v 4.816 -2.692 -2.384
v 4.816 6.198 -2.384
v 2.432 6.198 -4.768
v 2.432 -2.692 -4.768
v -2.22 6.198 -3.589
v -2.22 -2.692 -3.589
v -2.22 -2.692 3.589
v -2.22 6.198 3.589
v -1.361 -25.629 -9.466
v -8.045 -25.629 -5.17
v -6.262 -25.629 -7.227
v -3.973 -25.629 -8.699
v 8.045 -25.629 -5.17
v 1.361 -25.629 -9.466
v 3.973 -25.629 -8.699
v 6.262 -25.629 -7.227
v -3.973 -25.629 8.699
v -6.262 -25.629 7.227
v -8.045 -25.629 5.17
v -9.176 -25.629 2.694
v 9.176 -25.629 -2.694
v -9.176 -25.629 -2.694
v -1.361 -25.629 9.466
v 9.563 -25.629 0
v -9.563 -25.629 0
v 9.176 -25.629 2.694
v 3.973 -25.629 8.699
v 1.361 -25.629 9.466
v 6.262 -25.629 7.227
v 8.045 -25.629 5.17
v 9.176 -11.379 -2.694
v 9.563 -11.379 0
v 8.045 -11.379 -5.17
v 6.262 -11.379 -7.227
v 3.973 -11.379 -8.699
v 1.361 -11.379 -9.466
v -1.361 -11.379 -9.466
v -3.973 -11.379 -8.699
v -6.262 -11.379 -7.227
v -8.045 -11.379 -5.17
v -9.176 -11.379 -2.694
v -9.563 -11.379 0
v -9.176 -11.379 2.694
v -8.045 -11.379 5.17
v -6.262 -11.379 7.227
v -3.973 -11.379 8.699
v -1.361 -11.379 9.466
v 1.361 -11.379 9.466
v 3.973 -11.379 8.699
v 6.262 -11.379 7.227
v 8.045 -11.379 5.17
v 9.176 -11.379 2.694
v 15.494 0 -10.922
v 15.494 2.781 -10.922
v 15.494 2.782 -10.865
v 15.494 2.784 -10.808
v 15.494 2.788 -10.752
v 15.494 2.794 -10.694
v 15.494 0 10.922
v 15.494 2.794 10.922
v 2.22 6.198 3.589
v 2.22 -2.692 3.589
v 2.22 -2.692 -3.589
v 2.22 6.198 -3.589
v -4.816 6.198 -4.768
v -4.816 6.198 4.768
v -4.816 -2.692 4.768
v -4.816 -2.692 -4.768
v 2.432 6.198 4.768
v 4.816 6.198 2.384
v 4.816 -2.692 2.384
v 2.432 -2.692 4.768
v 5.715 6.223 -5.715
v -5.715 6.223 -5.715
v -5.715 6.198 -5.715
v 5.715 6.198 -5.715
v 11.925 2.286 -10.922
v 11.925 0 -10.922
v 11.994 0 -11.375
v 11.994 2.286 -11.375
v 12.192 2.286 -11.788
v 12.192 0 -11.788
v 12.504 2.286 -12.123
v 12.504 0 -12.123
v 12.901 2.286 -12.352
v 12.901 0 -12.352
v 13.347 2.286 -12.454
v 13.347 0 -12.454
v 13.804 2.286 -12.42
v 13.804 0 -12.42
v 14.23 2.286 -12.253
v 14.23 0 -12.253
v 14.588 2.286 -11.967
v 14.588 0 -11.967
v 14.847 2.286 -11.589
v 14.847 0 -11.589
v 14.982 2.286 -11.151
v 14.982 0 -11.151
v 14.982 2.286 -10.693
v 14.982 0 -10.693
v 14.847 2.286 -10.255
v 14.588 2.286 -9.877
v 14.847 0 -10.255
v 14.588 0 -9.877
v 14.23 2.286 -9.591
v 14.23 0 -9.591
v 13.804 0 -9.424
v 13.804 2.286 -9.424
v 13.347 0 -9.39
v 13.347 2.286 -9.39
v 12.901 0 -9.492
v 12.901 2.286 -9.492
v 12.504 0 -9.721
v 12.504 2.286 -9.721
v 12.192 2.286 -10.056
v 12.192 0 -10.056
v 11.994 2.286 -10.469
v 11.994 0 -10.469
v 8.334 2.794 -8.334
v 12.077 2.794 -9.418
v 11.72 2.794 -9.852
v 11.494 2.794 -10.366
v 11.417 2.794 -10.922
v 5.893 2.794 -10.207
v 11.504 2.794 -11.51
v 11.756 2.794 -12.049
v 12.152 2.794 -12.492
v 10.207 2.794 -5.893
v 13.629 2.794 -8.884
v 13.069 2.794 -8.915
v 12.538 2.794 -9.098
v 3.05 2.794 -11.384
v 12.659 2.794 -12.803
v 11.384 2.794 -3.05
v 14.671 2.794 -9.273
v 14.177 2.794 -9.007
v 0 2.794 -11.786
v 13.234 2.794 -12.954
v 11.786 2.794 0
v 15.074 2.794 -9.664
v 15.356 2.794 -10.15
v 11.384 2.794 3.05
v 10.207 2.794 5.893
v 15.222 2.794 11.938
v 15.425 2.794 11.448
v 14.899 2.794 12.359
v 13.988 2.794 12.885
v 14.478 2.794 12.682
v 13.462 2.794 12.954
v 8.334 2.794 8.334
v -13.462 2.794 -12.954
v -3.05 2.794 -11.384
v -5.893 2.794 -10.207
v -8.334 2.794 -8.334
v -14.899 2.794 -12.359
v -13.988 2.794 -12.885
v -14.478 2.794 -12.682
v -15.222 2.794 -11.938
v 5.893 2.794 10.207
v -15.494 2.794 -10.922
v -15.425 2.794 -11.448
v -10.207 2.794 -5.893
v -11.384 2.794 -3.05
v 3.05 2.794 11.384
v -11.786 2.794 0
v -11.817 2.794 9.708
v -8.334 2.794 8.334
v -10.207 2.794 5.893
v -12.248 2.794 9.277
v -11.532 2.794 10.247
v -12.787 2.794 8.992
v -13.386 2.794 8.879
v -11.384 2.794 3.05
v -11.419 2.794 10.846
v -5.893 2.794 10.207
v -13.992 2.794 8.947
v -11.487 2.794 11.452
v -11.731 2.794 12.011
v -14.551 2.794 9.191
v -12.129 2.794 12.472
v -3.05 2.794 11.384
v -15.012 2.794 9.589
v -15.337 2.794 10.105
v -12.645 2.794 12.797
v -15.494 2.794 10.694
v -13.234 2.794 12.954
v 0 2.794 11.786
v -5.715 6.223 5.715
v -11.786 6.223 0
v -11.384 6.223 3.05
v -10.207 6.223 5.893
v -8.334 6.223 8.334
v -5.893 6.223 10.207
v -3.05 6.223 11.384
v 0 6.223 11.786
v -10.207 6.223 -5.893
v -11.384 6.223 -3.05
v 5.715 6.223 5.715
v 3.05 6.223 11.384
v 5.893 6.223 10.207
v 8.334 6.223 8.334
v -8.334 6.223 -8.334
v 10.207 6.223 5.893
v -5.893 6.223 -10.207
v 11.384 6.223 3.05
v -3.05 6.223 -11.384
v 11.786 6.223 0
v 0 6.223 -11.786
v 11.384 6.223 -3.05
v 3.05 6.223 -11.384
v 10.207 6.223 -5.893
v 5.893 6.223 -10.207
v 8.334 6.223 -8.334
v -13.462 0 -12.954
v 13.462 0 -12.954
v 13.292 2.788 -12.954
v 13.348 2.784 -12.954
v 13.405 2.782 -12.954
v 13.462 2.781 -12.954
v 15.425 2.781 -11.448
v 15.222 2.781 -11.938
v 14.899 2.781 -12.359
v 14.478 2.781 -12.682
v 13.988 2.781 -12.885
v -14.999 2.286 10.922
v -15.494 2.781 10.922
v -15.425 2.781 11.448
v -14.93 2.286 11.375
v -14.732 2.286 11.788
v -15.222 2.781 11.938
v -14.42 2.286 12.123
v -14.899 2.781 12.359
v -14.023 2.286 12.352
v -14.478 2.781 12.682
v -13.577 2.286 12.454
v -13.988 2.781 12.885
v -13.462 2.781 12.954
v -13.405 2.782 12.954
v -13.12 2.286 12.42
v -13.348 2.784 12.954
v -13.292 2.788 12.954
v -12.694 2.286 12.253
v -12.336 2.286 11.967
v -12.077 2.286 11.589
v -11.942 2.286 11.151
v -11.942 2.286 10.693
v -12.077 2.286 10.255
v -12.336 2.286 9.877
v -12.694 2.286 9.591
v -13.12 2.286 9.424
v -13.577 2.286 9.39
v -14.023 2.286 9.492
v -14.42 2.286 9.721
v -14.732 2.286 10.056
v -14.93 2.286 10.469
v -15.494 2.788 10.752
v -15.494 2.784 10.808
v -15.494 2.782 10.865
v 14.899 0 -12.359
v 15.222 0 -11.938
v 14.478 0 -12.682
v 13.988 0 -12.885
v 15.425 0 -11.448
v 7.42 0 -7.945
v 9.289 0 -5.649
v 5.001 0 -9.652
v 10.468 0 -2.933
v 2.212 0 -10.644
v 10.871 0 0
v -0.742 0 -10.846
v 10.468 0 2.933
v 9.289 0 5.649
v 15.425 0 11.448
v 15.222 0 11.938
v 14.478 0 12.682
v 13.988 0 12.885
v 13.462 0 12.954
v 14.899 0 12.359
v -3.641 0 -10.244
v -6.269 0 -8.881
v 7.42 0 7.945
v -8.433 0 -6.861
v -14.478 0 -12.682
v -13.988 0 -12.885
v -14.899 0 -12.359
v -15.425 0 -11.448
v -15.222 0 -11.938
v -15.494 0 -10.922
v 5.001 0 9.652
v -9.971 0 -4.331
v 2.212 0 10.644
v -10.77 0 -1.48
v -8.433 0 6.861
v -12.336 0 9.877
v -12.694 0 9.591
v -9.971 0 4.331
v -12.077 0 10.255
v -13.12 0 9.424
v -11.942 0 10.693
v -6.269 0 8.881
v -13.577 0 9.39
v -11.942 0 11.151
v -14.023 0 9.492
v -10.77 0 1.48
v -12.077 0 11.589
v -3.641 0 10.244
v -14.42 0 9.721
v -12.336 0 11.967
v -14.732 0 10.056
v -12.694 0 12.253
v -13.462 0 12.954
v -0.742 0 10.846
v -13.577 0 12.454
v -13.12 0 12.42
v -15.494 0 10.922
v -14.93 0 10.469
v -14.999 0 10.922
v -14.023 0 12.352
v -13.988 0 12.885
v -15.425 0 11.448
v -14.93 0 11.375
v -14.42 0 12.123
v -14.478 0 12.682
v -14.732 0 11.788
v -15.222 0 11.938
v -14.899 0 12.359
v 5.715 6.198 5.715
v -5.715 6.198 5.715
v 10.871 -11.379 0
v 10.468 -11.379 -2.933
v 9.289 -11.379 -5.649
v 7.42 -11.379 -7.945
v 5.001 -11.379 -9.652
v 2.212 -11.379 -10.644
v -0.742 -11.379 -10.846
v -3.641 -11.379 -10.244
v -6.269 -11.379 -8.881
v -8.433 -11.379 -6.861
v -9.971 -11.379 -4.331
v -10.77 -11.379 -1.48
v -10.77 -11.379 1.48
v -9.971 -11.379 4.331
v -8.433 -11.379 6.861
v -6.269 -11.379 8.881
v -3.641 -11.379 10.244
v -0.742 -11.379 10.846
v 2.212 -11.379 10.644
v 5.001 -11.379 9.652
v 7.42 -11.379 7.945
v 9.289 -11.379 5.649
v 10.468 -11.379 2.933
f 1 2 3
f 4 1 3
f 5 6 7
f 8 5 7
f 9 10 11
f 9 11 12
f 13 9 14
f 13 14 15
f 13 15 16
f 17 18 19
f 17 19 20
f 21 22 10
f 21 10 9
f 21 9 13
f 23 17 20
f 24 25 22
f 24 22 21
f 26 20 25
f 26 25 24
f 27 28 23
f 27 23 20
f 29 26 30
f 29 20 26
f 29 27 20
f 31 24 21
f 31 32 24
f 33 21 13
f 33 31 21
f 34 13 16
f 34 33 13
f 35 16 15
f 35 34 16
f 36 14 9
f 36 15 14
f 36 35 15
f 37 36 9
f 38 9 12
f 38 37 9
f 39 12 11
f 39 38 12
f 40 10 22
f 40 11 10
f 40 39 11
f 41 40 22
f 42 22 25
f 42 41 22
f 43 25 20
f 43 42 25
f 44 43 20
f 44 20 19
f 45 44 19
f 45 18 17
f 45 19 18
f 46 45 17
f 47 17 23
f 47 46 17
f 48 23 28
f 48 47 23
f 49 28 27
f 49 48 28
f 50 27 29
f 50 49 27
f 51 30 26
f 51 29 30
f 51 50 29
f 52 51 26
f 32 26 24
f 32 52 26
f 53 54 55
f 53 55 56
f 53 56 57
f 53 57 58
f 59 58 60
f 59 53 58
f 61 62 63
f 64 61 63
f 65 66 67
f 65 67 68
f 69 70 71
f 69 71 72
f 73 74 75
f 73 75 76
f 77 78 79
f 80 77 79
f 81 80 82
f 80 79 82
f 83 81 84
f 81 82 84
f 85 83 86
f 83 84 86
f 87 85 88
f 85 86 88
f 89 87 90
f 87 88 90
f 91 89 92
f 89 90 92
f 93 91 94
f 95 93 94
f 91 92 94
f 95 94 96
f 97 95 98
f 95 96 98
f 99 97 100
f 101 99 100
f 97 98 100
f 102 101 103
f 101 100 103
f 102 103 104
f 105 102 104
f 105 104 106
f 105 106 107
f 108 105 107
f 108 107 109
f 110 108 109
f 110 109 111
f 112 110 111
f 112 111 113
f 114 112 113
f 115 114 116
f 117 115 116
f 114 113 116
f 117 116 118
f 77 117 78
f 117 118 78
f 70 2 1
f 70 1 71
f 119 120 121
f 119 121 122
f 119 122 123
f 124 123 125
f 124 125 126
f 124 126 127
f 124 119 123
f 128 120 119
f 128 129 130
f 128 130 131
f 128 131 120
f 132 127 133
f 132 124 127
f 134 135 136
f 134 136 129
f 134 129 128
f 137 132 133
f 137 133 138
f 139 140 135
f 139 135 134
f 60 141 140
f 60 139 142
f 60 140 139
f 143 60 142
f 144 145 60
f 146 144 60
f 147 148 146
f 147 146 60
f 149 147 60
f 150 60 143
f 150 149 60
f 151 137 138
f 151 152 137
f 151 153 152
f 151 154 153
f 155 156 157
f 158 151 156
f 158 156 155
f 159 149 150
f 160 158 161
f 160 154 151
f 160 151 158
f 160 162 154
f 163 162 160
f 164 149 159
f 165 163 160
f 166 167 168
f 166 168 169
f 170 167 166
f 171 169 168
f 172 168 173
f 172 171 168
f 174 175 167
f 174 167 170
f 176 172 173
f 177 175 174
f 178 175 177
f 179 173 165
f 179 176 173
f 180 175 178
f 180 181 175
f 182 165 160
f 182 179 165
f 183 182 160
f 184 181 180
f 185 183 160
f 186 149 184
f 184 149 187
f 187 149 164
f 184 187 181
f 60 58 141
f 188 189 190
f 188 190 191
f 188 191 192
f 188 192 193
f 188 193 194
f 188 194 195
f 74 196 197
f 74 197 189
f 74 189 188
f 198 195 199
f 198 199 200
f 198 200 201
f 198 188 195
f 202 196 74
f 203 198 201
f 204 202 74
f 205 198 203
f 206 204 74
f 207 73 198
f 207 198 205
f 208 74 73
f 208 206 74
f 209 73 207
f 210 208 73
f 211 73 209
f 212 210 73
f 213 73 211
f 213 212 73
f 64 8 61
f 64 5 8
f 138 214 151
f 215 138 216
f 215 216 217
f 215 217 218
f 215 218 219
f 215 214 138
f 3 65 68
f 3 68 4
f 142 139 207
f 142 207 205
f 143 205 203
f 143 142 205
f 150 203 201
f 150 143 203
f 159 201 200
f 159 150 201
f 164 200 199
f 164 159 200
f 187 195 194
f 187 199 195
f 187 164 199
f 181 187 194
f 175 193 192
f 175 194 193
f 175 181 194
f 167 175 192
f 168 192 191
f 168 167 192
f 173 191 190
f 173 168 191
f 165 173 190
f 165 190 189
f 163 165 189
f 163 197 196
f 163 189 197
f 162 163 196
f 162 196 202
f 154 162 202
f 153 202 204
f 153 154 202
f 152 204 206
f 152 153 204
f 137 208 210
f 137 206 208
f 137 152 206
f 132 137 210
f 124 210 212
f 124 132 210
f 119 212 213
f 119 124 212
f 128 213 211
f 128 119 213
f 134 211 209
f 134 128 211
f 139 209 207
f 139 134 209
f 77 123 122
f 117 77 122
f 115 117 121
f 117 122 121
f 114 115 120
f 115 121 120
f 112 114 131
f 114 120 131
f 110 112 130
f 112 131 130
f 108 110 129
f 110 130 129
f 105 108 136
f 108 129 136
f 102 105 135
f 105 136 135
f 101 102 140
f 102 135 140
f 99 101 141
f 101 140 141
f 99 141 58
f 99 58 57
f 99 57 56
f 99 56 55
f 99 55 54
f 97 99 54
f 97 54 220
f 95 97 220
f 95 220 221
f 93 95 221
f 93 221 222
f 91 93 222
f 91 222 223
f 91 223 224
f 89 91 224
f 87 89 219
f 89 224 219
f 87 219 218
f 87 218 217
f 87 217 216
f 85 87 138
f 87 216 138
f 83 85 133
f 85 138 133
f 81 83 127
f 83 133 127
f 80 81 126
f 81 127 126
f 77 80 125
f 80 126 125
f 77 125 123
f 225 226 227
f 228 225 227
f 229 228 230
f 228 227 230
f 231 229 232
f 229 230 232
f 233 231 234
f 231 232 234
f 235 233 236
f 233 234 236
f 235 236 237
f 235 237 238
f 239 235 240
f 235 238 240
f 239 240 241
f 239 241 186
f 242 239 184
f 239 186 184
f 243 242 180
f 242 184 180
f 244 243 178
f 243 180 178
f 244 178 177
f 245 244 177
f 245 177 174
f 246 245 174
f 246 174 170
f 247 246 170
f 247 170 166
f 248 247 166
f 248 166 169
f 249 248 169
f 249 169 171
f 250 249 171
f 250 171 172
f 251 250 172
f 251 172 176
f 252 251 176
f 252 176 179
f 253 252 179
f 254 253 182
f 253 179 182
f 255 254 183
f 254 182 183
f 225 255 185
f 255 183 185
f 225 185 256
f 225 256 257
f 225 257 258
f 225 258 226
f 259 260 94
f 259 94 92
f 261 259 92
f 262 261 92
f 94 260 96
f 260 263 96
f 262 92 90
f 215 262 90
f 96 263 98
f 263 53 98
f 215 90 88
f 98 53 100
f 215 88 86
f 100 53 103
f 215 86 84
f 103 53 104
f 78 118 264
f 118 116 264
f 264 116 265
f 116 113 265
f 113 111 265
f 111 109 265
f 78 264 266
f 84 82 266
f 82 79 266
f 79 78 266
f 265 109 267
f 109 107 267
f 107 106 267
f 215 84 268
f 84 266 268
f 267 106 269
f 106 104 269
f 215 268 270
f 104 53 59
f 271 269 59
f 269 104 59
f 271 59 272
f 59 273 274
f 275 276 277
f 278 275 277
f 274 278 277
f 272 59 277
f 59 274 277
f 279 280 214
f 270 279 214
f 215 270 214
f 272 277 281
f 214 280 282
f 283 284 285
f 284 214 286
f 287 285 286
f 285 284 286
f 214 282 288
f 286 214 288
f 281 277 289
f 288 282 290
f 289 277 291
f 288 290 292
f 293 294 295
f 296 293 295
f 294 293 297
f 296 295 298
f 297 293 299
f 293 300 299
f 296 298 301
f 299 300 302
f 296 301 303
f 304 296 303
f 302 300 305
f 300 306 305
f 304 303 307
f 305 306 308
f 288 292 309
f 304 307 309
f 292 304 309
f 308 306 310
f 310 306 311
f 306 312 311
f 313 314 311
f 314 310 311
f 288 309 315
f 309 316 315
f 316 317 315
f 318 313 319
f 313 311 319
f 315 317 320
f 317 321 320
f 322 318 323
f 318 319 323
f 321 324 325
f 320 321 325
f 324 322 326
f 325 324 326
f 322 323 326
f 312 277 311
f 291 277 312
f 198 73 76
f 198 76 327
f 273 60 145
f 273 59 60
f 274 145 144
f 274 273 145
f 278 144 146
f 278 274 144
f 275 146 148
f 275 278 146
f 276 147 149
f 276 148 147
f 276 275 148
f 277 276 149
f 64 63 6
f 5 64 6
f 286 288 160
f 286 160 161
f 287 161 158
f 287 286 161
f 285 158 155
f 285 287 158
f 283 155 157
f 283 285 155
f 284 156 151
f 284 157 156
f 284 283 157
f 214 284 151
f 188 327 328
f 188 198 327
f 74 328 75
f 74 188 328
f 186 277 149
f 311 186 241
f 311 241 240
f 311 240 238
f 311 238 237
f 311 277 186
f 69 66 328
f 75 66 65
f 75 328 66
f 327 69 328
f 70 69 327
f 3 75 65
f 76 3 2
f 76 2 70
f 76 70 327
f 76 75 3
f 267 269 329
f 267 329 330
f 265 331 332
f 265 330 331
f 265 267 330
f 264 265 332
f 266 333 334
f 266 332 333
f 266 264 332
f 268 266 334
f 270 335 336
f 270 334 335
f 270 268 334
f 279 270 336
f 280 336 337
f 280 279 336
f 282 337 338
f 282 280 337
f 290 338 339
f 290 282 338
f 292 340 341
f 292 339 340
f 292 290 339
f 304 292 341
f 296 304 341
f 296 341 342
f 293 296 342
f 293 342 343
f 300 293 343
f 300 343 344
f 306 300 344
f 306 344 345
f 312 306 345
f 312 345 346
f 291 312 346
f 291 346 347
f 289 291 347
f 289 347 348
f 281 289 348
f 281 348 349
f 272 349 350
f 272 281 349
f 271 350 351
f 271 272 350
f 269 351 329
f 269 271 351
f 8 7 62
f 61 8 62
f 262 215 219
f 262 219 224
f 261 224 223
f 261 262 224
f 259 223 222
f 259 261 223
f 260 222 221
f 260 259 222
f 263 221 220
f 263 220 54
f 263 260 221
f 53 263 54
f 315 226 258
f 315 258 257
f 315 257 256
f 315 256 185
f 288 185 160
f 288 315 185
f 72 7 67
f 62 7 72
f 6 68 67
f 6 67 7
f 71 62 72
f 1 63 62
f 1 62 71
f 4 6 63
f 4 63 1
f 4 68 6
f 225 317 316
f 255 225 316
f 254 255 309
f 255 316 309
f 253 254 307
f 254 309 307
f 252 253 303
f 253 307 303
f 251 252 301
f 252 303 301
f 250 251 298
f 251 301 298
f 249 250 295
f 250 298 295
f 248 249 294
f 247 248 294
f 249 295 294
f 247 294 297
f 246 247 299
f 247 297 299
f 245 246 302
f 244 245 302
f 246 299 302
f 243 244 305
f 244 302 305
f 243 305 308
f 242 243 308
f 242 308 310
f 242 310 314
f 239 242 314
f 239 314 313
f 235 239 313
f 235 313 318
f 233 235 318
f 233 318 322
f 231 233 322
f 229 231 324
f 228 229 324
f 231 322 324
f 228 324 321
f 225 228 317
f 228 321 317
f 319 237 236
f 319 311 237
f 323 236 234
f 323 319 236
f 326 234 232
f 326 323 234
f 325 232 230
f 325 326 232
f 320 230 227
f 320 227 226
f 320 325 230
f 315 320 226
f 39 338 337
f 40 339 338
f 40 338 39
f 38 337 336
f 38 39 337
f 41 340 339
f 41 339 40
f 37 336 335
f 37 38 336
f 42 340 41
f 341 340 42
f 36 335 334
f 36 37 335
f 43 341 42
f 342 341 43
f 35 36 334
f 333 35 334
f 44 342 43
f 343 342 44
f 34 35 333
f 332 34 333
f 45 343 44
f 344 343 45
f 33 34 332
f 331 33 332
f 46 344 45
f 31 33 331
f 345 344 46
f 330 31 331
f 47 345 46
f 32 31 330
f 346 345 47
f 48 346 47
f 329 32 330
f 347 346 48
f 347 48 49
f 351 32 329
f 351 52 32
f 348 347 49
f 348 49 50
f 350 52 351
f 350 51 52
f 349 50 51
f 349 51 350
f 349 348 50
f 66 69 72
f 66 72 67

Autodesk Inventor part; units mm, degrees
ref_plane "YZ Plane" through (0, 0, 0) normal (1, 0, 0) x (0, 1, 0)
ref_plane "XZ Plane" through (0, 0, 0) normal (0, 1, 0) x (-1, 0, 0)
ref_plane "XY Plane" through (0, 0, 0) normal (0, 0, 1) x (1, 0, 0)
sketch "Sketch1" plane through (0, 0, 0) normal (0, 1, 0) x (-1, 0, 0)
  line L0 (-15.494, 12.954) -> (15.494, 12.954)
  line L1 (15.494, 12.954) -> (15.494, -12.954)
  line L2 (15.494, -12.954) -> (-15.494, -12.954)
  line L3 (-15.494, -12.954) -> (-15.494, 12.954)
  line L4 (-15.494, 12.954) -> (15.494, -12.954) construction
  line L5 (15.494, 12.954) -> (-15.494, -12.954) construction
  line L6 (15.494, 12.954) -> (0, 0)
  line L7 (15.494, 12.954) -> (13.462, 12.954)
  line L8 (13.462, 12.954) -> (13.462, 10.922)
  line L9 (13.462, 10.922) -> (15.494, 10.922)
  circle A0 centre (13.462, 10.922) radius 2.032
  line L10 (-15.494, -12.954) -> (-13.462, -12.954)
  line L11 (-13.462, -12.954) -> (-13.462, -10.922)
  line L12 (-13.462, -10.922) -> (-15.494, -10.922)
  line L13 (-15.494, -10.922) -> (-15.494, -12.954)
  line L14 (-15.494, 12.954) -> (-13.462, 12.954)
  line L15 (-13.462, 12.954) -> (-13.462, 10.922)
  line L16 (-13.462, 10.922) -> (-15.494, 10.922)
  line L17 (-15.494, 10.922) -> (-15.494, 12.954)
  line L18 (15.494, -12.954) -> (13.462, -12.954)
  line L19 (13.462, -12.954) -> (13.462, -10.922)
  line L20 (13.462, -10.922) -> (15.494, -10.922)
  line L21 (15.494, -10.922) -> (15.494, -12.954)
  circle A1 centre (13.462, -10.922) radius 2.032
  circle A2 centre (-13.462, 10.922) radius 2.032
  circle A3 centre (-13.462, -10.922) radius 2.032
  circle A4 centre (-13.462, 10.922) radius 1.5367
  circle A5 centre (13.462, 10.922) radius 1.5367
  circle A6 centre (13.462, -10.922) radius 1.5367
  circle A7 centre (-13.462, -10.922) radius 1.5367
  dimension "d0" = 30.988
  dimension "d1" = 25.908
  dimension "d2" = 2.032
  dimension "d3" = 2.032
  dimension "d4" = 2.032
  dimension "d5" = 2.032
  dimension "d6" = 3.0734
extrude "Extrusion1" add sketch "Sketch1" along normal blind 2.794 contours A2 L16 A4 L15 | L0 A0 L1 A1 L2 A3 L3 A2 | L15 A4 L16 A2 | A0 L6 A5 L8 | L8 A5 L6 A0 | A3 L11 A7 L12 | L12 A7 L11 A3 | A0 L9 A5 L6 | L6 A5 L9 A0 | A1 L20 A6 L19 | L19 A6 L20 A1
sketch "Sketch2" plane through (0, 2.794, 0) normal (0, 1, 0) x (1, 0, 0)
  circle A0 centre (-13.462, 10.922) radius 1.5367 projected
  circle A1 centre (-13.462, 10.922) radius 1.5367
  circle A2 centre (13.462, -10.922) radius 1.5367 projected
  circle A3 centre (13.462, -10.922) radius 1.5367
  point P0 (0, 0)
extrude "Extrusion2" add sketch "Sketch2" against normal blind 2.794
sketch "Sketch3" plane through (0, 2.794, 0) normal (0, 1, 0) x (1, 0, 0)
  circle A0 centre (0, 0) radius 11.7856
  dimension "d11" = 23.5712
extrude "Extrusion3" add sketch "Sketch3" along normal blind 3.429
sketch "Sketch4" plane through (0, 0, 0) normal (0, -1, 0) x (1, 0, 0)
  circle A0 centre (0, 0) radius 10.8712
  dimension "d14" = 21.7424
extrude "Extrusion4" add sketch "Sketch4" along normal blind 11.3792
sketch "Sketch5" plane through (0, -11.3792, 0) normal (0, -1, 0) x (1, 0, 0)
  circle A0 centre (0, 0) radius 9.5631
  dimension "d17" = 19.1262
extrude "Extrusion5" add sketch "Sketch5" along normal blind 14.2494
sketch "Sketch6" plane through (0, 6.223, 0) normal (0, 1, 0) x (1, 0, 0)
  line L0 (5.715, -5.715) -> (-5.715, -5.715)
  line L1 (-5.715, -5.715) -> (-5.715, 5.715)
  line L2 (-5.715, 5.715) -> (5.715, 5.715)
  line L3 (5.715, 5.715) -> (5.715, -5.715)
  line L4 (5.715, -5.715) -> (-5.715, 5.715) construction
  line L5 (-5.715, -5.715) -> (5.715, 5.715) construction
  point P0 (0, 0)
  dimension "d20" = 11.43
  dimension "d21" = 11.43
extrude "Extrusion6" cut sketch "Sketch6" against normal blind 0.0254
sketch "Sketch7" plane through (0, 6.1976, 0) normal (0, 1, 0) x (1, 0, 0)
  line L0 (4.8156, -4.768) -> (-4.8156, -4.768)
  line L1 (-4.8156, -4.768) -> (-4.8156, 4.768)
  line L2 (-4.8156, 4.768) -> (4.8156, 4.768)
  line L3 (4.8156, 4.768) -> (4.8156, -4.768)
  line L4 (4.8156, -4.768) -> (-4.8156, 4.768) construction
  line L5 (-4.8156, -4.768) -> (4.8156, 4.768) construction
  line L6 (4.8156, -4.768) -> (4.8156, 0)
  line L7 (4.8156, -2.384) -> (2.4316, -4.768)
  line L8 (4.8156, -2.384) -> (8.1872, -2.384) construction
  line L9 (4.8156, 0) -> (4.8156, 4.768)
  line L10 (4.8156, 2.384) -> (2.4316, 4.768)
  line L11 (4.8156, 2.384) -> (8.1872, 2.384) construction
  point P0 (0, 0)
  dimension "d24" = 135
  dimension "d25" = 135
extrude "Extrusion7" cut sketch "Sketch7" against normal blind 8.89 contours L0 L1 L2 L10 L3 L7
sketch "Sketch8" plane through (0, -2.6924, 0) normal (0, 1, 0) x (1, 0, 0)
  line L0 (-2.2203, -3.589) -> (2.2203, -3.589)
  line L1 (2.2203, -3.589) -> (2.2203, 3.589)
  line L2 (2.2203, 3.589) -> (-2.2203, 3.589)
  line L3 (-2.2203, 3.589) -> (-2.2203, -3.589)
  line L4 (-2.2203, -3.589) -> (2.2203, 3.589) construction
  line L5 (2.2203, -3.589) -> (-2.2203, 3.589) construction
  point P0 (0, 0)
extrude "Extrusion8" add sketch "Sketch8" along normal blind 8.89
chamfer "Chamfer1" distance 0.508 angle 45 2 edges at (-11.9253, 2.794, 10.922) (14.9987, 2.794, -10.922)
properties part number "USB Type B Socket"
